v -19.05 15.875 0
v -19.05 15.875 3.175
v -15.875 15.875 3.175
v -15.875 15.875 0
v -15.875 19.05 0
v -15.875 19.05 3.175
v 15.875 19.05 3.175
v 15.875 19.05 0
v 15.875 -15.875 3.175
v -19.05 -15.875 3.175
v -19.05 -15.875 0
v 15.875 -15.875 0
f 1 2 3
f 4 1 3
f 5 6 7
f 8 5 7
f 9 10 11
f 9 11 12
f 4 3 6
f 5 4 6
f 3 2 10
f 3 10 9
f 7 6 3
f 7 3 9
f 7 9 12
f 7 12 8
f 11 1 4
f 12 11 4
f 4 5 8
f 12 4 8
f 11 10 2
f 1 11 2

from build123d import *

# Parameters (mm, degrees)
F0_W     = 31.75
F0_H     = 31.75
F1_DEPTH = 3.175
F2_W     = 31.75
F2_H     = 3.175
F3_DEPTH = 3.175
F4_W     = 3.175
F4_H     = 31.75
F5_DEPTH = 3.175


# Not quite as in the source:
# - a length typed as a fraction of an inch, garbled in the dataset ("3 / 203.2 mm" for 3/8 in), is restored


with BuildPart() as f1:
    # F0 (on Top) → F1 (new body)
    with BuildSketch(Plane.XY):
        Rectangle(F0_W, F0_H)
    extrude(amount=F1_DEPTH)

    # F2 (on face) → F3 (join)
    with BuildSketch(Plane.XY.offset(3.175)):
        with Locations((0, 17.4625)):
            Rectangle(F2_W, F2_H)
    extrude(amount=-F3_DEPTH)

    # F4 (on face) → F5 (join)
    with BuildSketch(Plane.XY.offset(3.175)):
        with Locations((-17.4625, 0)):
            Rectangle(F4_W, F4_H)
    extrude(amount=-F5_DEPTH)


solid = f1.part
